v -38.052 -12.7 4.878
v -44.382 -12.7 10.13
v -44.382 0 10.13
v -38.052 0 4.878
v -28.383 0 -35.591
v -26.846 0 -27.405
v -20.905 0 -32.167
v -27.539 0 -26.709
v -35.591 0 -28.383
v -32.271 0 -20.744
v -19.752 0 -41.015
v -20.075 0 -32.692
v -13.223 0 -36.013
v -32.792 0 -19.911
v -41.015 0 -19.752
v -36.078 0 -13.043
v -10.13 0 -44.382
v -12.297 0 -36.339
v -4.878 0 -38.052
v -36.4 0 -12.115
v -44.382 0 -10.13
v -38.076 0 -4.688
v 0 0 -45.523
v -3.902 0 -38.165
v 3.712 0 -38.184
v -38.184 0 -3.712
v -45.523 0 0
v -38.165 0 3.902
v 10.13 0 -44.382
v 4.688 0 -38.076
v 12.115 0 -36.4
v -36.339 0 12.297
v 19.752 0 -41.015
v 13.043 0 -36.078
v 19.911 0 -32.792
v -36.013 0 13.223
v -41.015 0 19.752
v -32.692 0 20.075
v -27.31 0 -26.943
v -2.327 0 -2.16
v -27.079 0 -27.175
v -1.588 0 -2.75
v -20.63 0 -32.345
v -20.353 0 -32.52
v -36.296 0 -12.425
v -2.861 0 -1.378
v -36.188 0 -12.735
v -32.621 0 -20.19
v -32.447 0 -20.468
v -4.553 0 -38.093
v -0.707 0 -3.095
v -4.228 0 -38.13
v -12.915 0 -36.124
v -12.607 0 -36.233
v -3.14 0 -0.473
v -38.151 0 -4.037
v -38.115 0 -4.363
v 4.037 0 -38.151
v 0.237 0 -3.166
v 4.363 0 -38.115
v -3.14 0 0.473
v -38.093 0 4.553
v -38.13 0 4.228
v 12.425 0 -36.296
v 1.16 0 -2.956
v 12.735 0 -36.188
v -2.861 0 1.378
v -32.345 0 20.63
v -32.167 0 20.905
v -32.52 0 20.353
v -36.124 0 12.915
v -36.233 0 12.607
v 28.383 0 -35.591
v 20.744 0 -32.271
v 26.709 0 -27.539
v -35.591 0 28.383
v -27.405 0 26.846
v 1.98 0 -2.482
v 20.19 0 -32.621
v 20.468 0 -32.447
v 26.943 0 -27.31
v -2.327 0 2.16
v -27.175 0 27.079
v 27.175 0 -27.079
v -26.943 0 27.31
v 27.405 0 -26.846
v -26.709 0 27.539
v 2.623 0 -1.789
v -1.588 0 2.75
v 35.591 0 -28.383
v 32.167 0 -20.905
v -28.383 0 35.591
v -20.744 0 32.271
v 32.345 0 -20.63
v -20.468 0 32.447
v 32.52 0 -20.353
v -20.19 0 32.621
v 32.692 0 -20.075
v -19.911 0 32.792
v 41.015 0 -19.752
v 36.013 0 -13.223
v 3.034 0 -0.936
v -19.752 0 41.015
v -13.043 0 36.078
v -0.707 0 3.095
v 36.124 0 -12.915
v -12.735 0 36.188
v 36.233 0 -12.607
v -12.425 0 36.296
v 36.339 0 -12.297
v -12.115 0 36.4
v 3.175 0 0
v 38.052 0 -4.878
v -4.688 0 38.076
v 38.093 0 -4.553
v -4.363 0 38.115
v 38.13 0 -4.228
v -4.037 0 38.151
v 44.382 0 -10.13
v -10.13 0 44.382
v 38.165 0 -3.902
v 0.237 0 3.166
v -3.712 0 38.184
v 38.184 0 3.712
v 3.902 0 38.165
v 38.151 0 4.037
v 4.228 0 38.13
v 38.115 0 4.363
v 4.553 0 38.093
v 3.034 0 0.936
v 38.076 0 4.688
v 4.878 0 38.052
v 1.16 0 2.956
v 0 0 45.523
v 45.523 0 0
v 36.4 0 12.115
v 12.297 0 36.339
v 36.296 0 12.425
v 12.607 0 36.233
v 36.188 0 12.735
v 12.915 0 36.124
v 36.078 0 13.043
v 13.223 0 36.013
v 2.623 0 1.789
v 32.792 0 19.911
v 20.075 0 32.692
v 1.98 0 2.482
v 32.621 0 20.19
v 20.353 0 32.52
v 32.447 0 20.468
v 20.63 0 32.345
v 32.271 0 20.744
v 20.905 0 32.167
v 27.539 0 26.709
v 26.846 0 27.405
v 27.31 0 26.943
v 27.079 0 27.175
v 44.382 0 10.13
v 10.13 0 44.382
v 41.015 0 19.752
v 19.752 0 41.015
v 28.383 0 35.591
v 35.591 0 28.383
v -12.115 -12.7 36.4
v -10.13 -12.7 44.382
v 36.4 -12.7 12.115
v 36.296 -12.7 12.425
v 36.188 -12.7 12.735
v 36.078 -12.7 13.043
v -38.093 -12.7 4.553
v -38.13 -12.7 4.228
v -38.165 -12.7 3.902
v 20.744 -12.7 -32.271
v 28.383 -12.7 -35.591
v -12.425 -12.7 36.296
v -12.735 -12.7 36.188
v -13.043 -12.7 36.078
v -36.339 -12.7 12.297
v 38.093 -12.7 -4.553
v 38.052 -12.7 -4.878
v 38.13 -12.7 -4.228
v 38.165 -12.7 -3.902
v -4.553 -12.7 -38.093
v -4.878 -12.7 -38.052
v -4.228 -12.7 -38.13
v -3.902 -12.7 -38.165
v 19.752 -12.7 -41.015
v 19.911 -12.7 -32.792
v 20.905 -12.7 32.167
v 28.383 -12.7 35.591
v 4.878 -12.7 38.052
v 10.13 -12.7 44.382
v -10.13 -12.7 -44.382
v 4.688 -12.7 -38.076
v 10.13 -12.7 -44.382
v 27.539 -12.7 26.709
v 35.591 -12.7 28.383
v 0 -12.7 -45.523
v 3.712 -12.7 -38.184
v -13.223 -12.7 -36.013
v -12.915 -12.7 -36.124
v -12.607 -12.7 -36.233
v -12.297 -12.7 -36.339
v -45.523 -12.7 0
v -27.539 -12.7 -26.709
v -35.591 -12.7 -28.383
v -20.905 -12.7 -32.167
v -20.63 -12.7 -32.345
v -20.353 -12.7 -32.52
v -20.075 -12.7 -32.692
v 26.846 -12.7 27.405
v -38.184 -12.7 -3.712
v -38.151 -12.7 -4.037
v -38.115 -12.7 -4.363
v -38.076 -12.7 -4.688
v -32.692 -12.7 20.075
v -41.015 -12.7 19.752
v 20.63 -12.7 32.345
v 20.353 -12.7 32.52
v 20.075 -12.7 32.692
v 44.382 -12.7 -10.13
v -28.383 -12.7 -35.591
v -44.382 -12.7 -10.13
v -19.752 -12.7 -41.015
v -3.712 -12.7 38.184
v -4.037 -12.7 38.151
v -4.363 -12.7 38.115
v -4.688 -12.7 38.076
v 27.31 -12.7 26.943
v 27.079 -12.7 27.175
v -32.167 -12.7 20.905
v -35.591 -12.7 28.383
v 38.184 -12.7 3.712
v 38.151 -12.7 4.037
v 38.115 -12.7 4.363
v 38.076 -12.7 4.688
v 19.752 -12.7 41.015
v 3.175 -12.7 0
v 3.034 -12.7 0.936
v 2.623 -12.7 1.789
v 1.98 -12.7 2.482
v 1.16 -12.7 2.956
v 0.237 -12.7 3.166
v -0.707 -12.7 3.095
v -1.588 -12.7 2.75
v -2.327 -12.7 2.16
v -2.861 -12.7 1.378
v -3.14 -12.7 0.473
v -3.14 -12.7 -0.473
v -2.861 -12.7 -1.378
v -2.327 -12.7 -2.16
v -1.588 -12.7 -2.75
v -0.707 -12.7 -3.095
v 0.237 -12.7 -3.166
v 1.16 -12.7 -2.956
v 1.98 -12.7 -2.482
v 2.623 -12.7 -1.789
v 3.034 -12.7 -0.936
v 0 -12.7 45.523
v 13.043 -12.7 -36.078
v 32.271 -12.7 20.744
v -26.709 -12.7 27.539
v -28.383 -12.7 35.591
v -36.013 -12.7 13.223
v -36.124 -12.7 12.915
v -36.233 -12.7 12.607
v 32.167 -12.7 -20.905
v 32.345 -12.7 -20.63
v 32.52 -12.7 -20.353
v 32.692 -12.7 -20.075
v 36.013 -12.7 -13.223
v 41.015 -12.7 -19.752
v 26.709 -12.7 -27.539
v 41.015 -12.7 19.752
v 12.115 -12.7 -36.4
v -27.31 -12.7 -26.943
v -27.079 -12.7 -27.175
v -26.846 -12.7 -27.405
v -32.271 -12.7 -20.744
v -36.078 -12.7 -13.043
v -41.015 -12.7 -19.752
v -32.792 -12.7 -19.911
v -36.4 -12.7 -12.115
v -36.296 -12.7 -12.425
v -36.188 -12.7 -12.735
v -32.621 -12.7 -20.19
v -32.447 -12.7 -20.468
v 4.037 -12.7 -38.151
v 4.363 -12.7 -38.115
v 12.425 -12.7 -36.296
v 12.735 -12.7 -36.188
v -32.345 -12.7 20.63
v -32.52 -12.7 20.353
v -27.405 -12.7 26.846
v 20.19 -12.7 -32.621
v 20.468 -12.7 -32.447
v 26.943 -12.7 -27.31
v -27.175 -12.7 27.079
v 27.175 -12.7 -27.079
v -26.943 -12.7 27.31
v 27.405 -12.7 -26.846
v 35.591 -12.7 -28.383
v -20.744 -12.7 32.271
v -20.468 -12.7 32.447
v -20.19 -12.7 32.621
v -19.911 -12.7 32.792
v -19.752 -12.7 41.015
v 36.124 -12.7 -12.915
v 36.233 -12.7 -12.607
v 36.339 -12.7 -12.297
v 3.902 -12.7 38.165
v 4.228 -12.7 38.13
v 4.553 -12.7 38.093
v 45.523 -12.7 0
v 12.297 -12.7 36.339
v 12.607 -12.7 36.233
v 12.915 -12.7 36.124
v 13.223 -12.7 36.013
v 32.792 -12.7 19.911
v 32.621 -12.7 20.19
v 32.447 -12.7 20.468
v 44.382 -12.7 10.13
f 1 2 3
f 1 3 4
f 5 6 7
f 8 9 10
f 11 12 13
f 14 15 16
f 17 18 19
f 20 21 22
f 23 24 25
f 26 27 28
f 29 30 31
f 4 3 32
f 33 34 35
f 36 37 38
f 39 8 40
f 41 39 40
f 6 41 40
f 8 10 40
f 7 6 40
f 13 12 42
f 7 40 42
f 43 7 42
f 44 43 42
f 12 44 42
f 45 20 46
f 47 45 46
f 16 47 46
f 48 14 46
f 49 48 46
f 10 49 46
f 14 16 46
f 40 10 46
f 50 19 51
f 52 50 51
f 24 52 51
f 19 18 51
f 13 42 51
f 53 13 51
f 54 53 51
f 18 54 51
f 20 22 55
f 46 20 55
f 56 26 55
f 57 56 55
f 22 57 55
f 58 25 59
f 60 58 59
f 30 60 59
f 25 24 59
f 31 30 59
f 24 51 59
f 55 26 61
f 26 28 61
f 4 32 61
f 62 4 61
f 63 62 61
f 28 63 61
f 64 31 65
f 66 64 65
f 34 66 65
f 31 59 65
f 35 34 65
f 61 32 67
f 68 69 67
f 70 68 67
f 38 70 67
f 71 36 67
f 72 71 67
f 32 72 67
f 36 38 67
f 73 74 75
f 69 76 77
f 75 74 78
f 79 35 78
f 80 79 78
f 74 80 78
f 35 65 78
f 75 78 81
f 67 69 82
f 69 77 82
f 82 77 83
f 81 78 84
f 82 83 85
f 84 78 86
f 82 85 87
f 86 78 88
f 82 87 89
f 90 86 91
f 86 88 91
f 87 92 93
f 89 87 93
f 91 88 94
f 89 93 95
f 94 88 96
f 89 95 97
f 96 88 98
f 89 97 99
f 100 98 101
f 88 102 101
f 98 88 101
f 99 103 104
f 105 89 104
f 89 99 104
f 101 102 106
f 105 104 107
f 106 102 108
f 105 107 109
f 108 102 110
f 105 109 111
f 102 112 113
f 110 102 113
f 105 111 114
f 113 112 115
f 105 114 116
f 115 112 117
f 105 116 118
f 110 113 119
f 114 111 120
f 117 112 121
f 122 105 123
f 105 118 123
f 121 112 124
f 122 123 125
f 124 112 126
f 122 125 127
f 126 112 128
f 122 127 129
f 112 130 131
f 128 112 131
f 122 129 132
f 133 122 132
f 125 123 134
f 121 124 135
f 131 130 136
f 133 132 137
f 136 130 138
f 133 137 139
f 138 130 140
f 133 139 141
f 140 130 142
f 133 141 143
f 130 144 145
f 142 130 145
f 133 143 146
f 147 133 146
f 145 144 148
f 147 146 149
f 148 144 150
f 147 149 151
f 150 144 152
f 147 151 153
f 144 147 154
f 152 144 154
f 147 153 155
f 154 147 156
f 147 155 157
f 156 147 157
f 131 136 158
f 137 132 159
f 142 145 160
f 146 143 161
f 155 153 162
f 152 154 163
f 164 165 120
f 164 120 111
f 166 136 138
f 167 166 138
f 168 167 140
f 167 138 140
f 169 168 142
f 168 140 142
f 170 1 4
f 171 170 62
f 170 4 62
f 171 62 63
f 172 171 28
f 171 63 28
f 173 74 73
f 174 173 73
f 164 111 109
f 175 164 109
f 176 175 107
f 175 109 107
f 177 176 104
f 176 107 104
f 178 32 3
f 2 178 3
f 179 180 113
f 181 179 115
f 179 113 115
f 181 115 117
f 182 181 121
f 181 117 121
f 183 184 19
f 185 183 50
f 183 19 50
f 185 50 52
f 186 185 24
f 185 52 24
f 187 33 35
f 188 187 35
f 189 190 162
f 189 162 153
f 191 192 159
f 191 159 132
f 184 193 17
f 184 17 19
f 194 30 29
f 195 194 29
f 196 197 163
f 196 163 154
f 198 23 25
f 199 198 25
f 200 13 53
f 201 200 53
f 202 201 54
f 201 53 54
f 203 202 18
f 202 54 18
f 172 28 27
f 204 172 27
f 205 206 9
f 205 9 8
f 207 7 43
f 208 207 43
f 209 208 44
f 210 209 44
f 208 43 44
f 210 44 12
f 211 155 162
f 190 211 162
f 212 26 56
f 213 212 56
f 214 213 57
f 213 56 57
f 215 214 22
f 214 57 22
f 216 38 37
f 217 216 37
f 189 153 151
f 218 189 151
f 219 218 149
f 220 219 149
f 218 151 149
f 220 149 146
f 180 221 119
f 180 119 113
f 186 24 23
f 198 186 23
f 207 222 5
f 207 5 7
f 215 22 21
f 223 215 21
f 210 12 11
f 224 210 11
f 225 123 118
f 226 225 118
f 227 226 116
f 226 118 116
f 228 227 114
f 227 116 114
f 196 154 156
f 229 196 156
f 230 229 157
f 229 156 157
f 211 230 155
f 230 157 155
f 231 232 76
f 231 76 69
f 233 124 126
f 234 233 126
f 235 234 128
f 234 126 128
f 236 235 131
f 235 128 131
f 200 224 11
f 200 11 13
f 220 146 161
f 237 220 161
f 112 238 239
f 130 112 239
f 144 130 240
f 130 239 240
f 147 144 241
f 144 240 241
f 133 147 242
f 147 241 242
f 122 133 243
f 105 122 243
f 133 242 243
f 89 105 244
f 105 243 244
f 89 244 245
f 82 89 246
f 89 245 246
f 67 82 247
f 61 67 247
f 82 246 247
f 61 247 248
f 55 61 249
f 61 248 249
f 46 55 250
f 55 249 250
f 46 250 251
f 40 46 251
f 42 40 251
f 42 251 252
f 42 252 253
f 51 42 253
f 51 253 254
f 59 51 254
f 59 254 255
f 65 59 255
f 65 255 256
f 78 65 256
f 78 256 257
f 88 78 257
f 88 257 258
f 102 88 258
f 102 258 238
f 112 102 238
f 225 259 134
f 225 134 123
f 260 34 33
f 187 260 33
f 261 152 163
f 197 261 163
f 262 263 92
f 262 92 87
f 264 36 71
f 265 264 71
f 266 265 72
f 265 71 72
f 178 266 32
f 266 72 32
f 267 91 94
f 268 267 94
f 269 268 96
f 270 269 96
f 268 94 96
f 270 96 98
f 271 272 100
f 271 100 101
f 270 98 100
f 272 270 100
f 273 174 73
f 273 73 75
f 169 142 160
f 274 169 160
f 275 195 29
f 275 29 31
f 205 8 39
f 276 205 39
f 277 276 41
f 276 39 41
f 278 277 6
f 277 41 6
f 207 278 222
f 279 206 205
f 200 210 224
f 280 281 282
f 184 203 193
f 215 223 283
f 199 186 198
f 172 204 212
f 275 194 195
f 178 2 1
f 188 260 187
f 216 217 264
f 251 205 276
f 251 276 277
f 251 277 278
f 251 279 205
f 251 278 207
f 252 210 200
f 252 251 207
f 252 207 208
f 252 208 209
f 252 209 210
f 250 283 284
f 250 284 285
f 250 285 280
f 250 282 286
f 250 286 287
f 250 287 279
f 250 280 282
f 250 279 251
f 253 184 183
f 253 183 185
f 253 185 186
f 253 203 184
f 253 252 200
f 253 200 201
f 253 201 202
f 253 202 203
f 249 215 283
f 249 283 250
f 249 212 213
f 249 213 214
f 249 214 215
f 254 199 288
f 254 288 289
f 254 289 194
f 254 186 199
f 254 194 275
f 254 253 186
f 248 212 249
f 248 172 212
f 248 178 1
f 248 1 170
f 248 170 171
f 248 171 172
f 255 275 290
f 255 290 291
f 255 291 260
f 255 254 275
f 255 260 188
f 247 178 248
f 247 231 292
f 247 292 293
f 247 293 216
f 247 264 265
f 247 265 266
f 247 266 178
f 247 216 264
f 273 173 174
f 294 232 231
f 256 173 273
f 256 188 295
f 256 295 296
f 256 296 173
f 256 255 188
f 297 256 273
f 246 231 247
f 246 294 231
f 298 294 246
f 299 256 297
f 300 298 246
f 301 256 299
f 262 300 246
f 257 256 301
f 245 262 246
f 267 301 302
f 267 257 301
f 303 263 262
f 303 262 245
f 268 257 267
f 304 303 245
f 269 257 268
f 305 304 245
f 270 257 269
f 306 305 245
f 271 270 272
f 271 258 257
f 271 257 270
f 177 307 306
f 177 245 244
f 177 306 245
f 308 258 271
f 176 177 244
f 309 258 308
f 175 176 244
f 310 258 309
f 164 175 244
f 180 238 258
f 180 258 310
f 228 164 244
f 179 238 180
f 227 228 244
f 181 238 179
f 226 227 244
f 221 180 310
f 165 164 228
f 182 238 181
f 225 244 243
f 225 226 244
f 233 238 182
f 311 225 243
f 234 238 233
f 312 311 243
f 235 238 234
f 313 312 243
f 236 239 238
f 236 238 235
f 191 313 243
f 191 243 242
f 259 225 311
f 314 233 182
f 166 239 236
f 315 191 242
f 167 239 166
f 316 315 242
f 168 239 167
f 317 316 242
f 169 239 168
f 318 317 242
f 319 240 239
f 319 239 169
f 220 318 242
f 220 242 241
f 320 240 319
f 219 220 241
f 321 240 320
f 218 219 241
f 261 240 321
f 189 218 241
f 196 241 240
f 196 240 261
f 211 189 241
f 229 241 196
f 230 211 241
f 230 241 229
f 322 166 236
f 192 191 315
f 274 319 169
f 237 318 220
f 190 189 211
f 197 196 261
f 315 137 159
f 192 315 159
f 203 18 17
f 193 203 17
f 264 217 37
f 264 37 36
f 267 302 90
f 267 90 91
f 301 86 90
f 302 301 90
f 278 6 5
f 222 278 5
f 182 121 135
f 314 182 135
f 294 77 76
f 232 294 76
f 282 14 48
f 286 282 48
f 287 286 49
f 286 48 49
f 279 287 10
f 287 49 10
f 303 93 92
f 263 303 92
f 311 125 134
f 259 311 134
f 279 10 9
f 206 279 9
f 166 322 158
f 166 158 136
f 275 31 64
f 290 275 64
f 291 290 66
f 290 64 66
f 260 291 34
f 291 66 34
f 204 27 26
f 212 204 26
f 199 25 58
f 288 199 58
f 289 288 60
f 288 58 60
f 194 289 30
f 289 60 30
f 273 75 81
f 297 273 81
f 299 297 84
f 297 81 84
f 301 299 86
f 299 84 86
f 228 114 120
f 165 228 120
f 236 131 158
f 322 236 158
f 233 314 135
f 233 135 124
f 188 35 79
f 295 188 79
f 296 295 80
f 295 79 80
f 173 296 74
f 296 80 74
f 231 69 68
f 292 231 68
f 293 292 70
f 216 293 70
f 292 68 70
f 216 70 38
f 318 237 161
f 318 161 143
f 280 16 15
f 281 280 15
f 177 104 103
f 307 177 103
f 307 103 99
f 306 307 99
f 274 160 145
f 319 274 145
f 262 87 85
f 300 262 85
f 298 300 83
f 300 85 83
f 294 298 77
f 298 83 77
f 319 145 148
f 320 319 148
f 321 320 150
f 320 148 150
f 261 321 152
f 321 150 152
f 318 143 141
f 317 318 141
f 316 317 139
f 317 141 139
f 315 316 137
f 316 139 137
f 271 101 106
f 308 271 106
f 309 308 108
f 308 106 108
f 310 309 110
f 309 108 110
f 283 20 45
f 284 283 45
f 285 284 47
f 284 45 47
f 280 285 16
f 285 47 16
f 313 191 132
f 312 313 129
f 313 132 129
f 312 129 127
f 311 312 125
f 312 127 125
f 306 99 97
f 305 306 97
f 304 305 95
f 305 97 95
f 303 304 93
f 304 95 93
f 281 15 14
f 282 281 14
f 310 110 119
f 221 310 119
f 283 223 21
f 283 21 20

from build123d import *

# Parameters (mm, degrees)
F1_DEPTH = 12.7
F2_R     = 3.175
F3_DEPTH = 25.4


with BuildPart() as f1:
    # F0 (on Front) → F1 (new body)
    with BuildSketch(Plane.XZ):
        with BuildLine():
            ThreePointArc((38.16472, -3.90239), (38.313933, -1.95373), (38.363714, 0))
            ThreePointArc((38.363714, 0), (38.318696, 1.85798), (38.183747, 3.7116))
            ThreePointArc((38.183747, 3.7116), (38.133106, 4.200094), (38.076215, 4.6879))
            ThreePointArc((38.076215, 4.6879), (37.423071, 8.443238), (36.400492, 12.115225))
            ThreePointArc((36.400492, 12.115225), (36.24242, 12.580203), (36.078408, 13.04312))
            ThreePointArc((36.078408, 13.04312), (34.606, 16.558965), (32.791965, 19.911343))
            ThreePointArc((32.791965, 19.911343), (32.534388, 20.329489), (32.27148, 20.744303))
            ThreePointArc((32.27148, 20.744303), (30.053638, 23.844357), (27.539111, 26.709023))
            ThreePointArc((27.539111, 26.709023), (27.194947, 27.059368), (26.846325, 27.40528))
            ThreePointArc((26.846325, 27.40528), (23.994262, 29.934093), (20.905332, 32.1674))
            ThreePointArc((20.905332, 32.1674), (20.491837, 32.432378), (20.074983, 32.692041))
            ThreePointArc((20.074983, 32.692041), (16.731714, 34.522808), (13.223271, 36.01277))
            ThreePointArc((13.223271, 36.01277), (12.76118, 36.179094), (12.296998, 36.339488))
            ThreePointArc((12.296998, 36.339488), (8.630167, 37.380406), (4.878141, 38.05231))
            ThreePointArc((4.878141, 38.05231), (4.390625, 38.111638), (3.90239, 38.16472))
            ThreePointArc((3.90239, 38.16472), (0.095868, 38.363594), (-3.7116, 38.183747))
            ThreePointArc((-3.7116, 38.183747), (-4.200094, 38.133106), (-4.6879, 38.076215))
            ThreePointArc((-4.6879, 38.076215), (-8.443238, 37.423071), (-12.115225, 36.400492))
            ThreePointArc((-12.115225, 36.400492), (-12.580203, 36.24242), (-13.04312, 36.078408))
            ThreePointArc((-13.04312, 36.078408), (-16.558965, 34.606), (-19.911343, 32.791965))
            ThreePointArc((-19.911343, 32.791965), (-20.329489, 32.534388), (-20.744303, 32.27148))
            ThreePointArc((-20.744303, 32.27148), (-23.844357, 30.053638), (-26.709023, 27.539111))
            ThreePointArc((-26.709023, 27.539111), (-27.059368, 27.194947), (-27.40528, 26.846325))
            ThreePointArc((-27.40528, 26.846325), (-29.934093, 23.994262), (-32.1674, 20.905332))
            ThreePointArc((-32.1674, 20.905332), (-32.432378, 20.491837), (-32.692041, 20.074983))
            ThreePointArc((-32.692041, 20.074983), (-34.522808, 16.731714), (-36.01277, 13.223271))
            ThreePointArc((-36.01277, 13.223271), (-36.179094, 12.76118), (-36.339488, 12.296998))
            ThreePointArc((-36.339488, 12.296998), (-37.380406, 8.630167), (-38.05231, 4.878141))
            ThreePointArc((-38.05231, 4.878141), (-38.111638, 4.390625), (-38.16472, 3.90239))
            ThreePointArc((-38.16472, 3.90239), (-38.363594, 0.095868), (-38.183747, -3.7116))
            ThreePointArc((-38.183747, -3.7116), (-38.133106, -4.200094), (-38.076215, -4.6879))
            ThreePointArc((-38.076215, -4.6879), (-37.423071, -8.443238), (-36.400492, -12.115225))
            ThreePointArc((-36.400492, -12.115225), (-36.24242, -12.580203), (-36.078408, -13.04312))
            ThreePointArc((-36.078408, -13.04312), (-34.606, -16.558965), (-32.791965, -19.911343))
            ThreePointArc((-32.791965, -19.911343), (-32.534388, -20.329489), (-32.27148, -20.744303))
            ThreePointArc((-32.27148, -20.744303), (-30.053638, -23.844357), (-27.539111, -26.709023))
            ThreePointArc((-27.539111, -26.709023), (-27.194947, -27.059368), (-26.846325, -27.40528))
            ThreePointArc((-26.846325, -27.40528), (-23.994262, -29.934093), (-20.905332, -32.1674))
            ThreePointArc((-20.905332, -32.1674), (-20.491837, -32.432378), (-20.074983, -32.692041))
            ThreePointArc((-20.074983, -32.692041), (-16.731714, -34.522808), (-13.223271, -36.01277))
            ThreePointArc((-13.223271, -36.01277), (-12.76118, -36.179094), (-12.296998, -36.339488))
            ThreePointArc((-12.296998, -36.339488), (-8.630167, -37.380406), (-4.878141, -38.05231))
            ThreePointArc((-4.878141, -38.05231), (-4.390625, -38.111638), (-3.90239, -38.16472))
            ThreePointArc((-3.90239, -38.16472), (-0.095868, -38.363594), (3.7116, -38.183747))
            ThreePointArc((3.7116, -38.183747), (4.200094, -38.133106), (4.6879, -38.076215))
            ThreePointArc((4.6879, -38.076215), (8.443238, -37.423071), (12.115225, -36.400492))
            ThreePointArc((12.115225, -36.400492), (12.580203, -36.24242), (13.04312, -36.078408))
            ThreePointArc((13.04312, -36.078408), (16.558965, -34.606), (19.911343, -32.791965))
            ThreePointArc((19.911343, -32.791965), (20.329489, -32.534388), (20.744303, -32.27148))
            ThreePointArc((20.744303, -32.27148), (23.844357, -30.053638), (26.709023, -27.539111))
            ThreePointArc((26.709023, -27.539111), (27.059368, -27.194947), (27.40528, -26.846325))
            ThreePointArc((27.40528, -26.846325), (29.934093, -23.994262), (32.1674, -20.905332))
            ThreePointArc((32.1674, -20.905332), (32.432378, -20.491837), (32.692041, -20.074983))
            ThreePointArc((32.692041, -20.074983), (34.522808, -16.731714), (36.01277, -13.223271))
            ThreePointArc((36.01277, -13.223271), (36.179094, -12.76118), (36.339488, -12.296998))
            ThreePointArc((36.339488, -12.296998), (37.380406, -8.630167), (38.05231, -4.878141))
            ThreePointArc((38.05231, -4.878141), (38.111638, -4.390625), (38.16472, -3.90239))
        make_face()
        with BuildLine():
            ThreePointArc((38.183747, 3.7116), (38.318696, 1.85798), (38.363714, 0))
            ThreePointArc((38.363714, 0), (38.313933, -1.95373), (38.16472, -3.90239))
            Line((38.16472, -3.90239), (45.522928, 0))
            Line((45.522928, 0), (38.183747, 3.7116))
        make_face()
        with BuildLine():
            ThreePointArc((36.400492, 12.115225), (37.423071, 8.443238), (38.076215, 4.6879))
            Line((38.076215, 4.6879), (44.381573, 10.129805))
            Line((44.381573, 10.129805), (36.400492, 12.115225))
        make_face()
        with BuildLine():
            Line((44.381573, -10.129805), (38.05231, -4.878141))
            ThreePointArc((38.05231, -4.878141), (37.380406, -8.630167), (36.339488, -12.296998))
            Line((36.339488, -12.296998), (44.381573, -10.129805))
        make_face()
        with BuildLine():
            ThreePointArc((32.791965, 19.911343), (34.606, 16.558965), (36.078408, 13.04312))
            Line((36.078408, 13.04312), (41.014741, 19.751658))
            Line((41.014741, 19.751658), (32.791965, 19.911343))
        make_face()
        with BuildLine():
            Line((41.014741, -19.751658), (36.01277, -13.223271))
            ThreePointArc((36.01277, -13.223271), (34.522808, -16.731714), (32.692041, -20.074983))
            Line((32.692041, -20.074983), (41.014741, -19.751658))
        make_face()
        with BuildLine():
            ThreePointArc((27.539111, 26.709023), (30.053638, 23.844357), (32.27148, 20.744303))
            Line((32.27148, 20.744303), (35.591258, 28.383082))
            Line((35.591258, 28.383082), (27.539111, 26.709023))
        make_face()
        with BuildLine():
            Line((35.591258, -28.383082), (32.1674, -20.905332))
            ThreePointArc((32.1674, -20.905332), (29.934093, -23.994262), (27.40528, -26.846325))
            Line((27.40528, -26.846325), (35.591258, -28.383082))
        make_face()
        with BuildLine():
            ThreePointArc((20.905332, 32.1674), (23.994262, 29.934093), (26.846325, 27.40528))
            Line((26.846325, 27.40528), (28.383082, 35.591258))
            Line((28.383082, 35.591258), (20.905332, 32.1674))
        make_face()
        with BuildLine():
            Line((28.383082, -35.591258), (26.709023, -27.539111))
            ThreePointArc((26.709023, -27.539111), (23.844357, -30.053638), (20.744303, -32.27148))
            Line((20.744303, -32.27148), (28.383082, -35.591258))
        make_face()
        with BuildLine():
            ThreePointArc((13.223271, 36.01277), (16.731714, 34.522808), (20.074983, 32.692041))
            Line((20.074983, 32.692041), (19.751658, 41.014741))
            Line((19.751658, 41.014741), (13.223271, 36.01277))
        make_face()
        with BuildLine():
            Line((19.751658, -41.014741), (19.911343, -32.791965))
            ThreePointArc((19.911343, -32.791965), (16.558965, -34.606), (13.04312, -36.078408))
            Line((13.04312, -36.078408), (19.751658, -41.014741))
        make_face()
        with BuildLine():
            ThreePointArc((4.878141, 38.05231), (8.630167, 37.380406), (12.296998, 36.339488))
            Line((12.296998, 36.339488), (10.129805, 44.381573))
            Line((10.129805, 44.381573), (4.878141, 38.05231))
        make_face()
        with BuildLine():
            Line((10.129805, -44.381573), (12.115225, -36.400492))
            ThreePointArc((12.115225, -36.400492), (8.443238, -37.423071), (4.6879, -38.076215))
            Line((4.6879, -38.076215), (10.129805, -44.381573))
        make_face()
        with BuildLine():
            ThreePointArc((-3.7116, 38.183747), (0.095868, 38.363594), (3.90239, 38.16472))
            Line((3.90239, 38.16472), (0, 45.522928))
            Line((0, 45.522928), (-3.7116, 38.183747))
        make_face()
        with BuildLine():
            Line((0, -45.522928), (3.7116, -38.183747))
            ThreePointArc((3.7116, -38.183747), (-0.095868, -38.363594), (-3.90239, -38.16472))
            Line((-3.90239, -38.16472), (0, -45.522928))
        make_face()
        with BuildLine():
            ThreePointArc((-12.115225, 36.400492), (-8.443238, 37.423071), (-4.6879, 38.076215))
            Line((-4.6879, 38.076215), (-10.129805, 44.381573))
            Line((-10.129805, 44.381573), (-12.115225, 36.400492))
        make_face()
        with BuildLine():
            Line((-10.129805, -44.381573), (-4.878141, -38.05231))
            ThreePointArc((-4.878141, -38.05231), (-8.630167, -37.380406), (-12.296998, -36.339488))
            Line((-12.296998, -36.339488), (-10.129805, -44.381573))
        make_face()
        with BuildLine():
            ThreePointArc((-19.911343, 32.791965), (-16.558965, 34.606), (-13.04312, 36.078408))
            Line((-13.04312, 36.078408), (-19.751658, 41.014741))
            Line((-19.751658, 41.014741), (-19.911343, 32.791965))
        make_face()
        with BuildLine():
            Line((-19.751658, -41.014741), (-13.223271, -36.01277))
            ThreePointArc((-13.223271, -36.01277), (-16.731714, -34.522808), (-20.074983, -32.692041))
            Line((-20.074983, -32.692041), (-19.751658, -41.014741))
        make_face()
        with BuildLine():
            ThreePointArc((-26.709023, 27.539111), (-23.844357, 30.053638), (-20.744303, 32.27148))
            Line((-20.744303, 32.27148), (-28.383082, 35.591258))
            Line((-28.383082, 35.591258), (-26.709023, 27.539111))
        make_face()
        with BuildLine():
            Line((-28.383082, -35.591258), (-20.905332, -32.1674))
            ThreePointArc((-20.905332, -32.1674), (-23.994262, -29.934093), (-26.846325, -27.40528))
            Line((-26.846325, -27.40528), (-28.383082, -35.591258))
        make_face()
        with BuildLine():
            ThreePointArc((-32.1674, 20.905332), (-29.934093, 23.994262), (-27.40528, 26.846325))
            Line((-27.40528, 26.846325), (-35.591258, 28.383082))
            Line((-35.591258, 28.383082), (-32.1674, 20.905332))
        make_face()
        with BuildLine():
            Line((-35.591258, -28.383082), (-27.539111, -26.709023))
            ThreePointArc((-27.539111, -26.709023), (-30.053638, -23.844357), (-32.27148, -20.744303))
            Line((-32.27148, -20.744303), (-35.591258, -28.383082))
        make_face()
        with BuildLine():
            ThreePointArc((-36.01277, 13.223271), (-34.522808, 16.731714), (-32.692041, 20.074983))
            Line((-32.692041, 20.074983), (-41.014741, 19.751658))
            Line((-41.014741, 19.751658), (-36.01277, 13.223271))
        make_face()
        with BuildLine():
            Line((-41.014741, -19.751658), (-32.791965, -19.911343))
            ThreePointArc((-32.791965, -19.911343), (-34.606, -16.558965), (-36.078408, -13.04312))
            Line((-36.078408, -13.04312), (-41.014741, -19.751658))
        make_face()
        with BuildLine():
            ThreePointArc((-38.05231, 4.878141), (-37.380406, 8.630167), (-36.339488, 12.296998))
            Line((-36.339488, 12.296998), (-44.381573, 10.129805))
            Line((-44.381573, 10.129805), (-38.05231, 4.878141))
        make_face()
        with BuildLine():
            Line((-44.381573, -10.129805), (-36.400492, -12.115225))
            ThreePointArc((-36.400492, -12.115225), (-37.423071, -8.443238), (-38.076215, -4.6879))
            Line((-38.076215, -4.6879), (-44.381573, -10.129805))
        make_face()
        with BuildLine():
            ThreePointArc((-38.183747, -3.7116), (-38.363594, 0.095868), (-38.16472, 3.90239))
            Line((-38.16472, 3.90239), (-45.522928, 0))
            Line((-45.522928, 0), (-38.183747, -3.7116))
        make_face()
    extrude(amount=F1_DEPTH)

    # F2 (on face) → F3 (cut)
    with BuildSketch(Plane.XZ.offset(12.7)):
        Circle(F2_R)
    extrude(amount=-F3_DEPTH, mode=Mode.SUBTRACT)


solid = f1.part
